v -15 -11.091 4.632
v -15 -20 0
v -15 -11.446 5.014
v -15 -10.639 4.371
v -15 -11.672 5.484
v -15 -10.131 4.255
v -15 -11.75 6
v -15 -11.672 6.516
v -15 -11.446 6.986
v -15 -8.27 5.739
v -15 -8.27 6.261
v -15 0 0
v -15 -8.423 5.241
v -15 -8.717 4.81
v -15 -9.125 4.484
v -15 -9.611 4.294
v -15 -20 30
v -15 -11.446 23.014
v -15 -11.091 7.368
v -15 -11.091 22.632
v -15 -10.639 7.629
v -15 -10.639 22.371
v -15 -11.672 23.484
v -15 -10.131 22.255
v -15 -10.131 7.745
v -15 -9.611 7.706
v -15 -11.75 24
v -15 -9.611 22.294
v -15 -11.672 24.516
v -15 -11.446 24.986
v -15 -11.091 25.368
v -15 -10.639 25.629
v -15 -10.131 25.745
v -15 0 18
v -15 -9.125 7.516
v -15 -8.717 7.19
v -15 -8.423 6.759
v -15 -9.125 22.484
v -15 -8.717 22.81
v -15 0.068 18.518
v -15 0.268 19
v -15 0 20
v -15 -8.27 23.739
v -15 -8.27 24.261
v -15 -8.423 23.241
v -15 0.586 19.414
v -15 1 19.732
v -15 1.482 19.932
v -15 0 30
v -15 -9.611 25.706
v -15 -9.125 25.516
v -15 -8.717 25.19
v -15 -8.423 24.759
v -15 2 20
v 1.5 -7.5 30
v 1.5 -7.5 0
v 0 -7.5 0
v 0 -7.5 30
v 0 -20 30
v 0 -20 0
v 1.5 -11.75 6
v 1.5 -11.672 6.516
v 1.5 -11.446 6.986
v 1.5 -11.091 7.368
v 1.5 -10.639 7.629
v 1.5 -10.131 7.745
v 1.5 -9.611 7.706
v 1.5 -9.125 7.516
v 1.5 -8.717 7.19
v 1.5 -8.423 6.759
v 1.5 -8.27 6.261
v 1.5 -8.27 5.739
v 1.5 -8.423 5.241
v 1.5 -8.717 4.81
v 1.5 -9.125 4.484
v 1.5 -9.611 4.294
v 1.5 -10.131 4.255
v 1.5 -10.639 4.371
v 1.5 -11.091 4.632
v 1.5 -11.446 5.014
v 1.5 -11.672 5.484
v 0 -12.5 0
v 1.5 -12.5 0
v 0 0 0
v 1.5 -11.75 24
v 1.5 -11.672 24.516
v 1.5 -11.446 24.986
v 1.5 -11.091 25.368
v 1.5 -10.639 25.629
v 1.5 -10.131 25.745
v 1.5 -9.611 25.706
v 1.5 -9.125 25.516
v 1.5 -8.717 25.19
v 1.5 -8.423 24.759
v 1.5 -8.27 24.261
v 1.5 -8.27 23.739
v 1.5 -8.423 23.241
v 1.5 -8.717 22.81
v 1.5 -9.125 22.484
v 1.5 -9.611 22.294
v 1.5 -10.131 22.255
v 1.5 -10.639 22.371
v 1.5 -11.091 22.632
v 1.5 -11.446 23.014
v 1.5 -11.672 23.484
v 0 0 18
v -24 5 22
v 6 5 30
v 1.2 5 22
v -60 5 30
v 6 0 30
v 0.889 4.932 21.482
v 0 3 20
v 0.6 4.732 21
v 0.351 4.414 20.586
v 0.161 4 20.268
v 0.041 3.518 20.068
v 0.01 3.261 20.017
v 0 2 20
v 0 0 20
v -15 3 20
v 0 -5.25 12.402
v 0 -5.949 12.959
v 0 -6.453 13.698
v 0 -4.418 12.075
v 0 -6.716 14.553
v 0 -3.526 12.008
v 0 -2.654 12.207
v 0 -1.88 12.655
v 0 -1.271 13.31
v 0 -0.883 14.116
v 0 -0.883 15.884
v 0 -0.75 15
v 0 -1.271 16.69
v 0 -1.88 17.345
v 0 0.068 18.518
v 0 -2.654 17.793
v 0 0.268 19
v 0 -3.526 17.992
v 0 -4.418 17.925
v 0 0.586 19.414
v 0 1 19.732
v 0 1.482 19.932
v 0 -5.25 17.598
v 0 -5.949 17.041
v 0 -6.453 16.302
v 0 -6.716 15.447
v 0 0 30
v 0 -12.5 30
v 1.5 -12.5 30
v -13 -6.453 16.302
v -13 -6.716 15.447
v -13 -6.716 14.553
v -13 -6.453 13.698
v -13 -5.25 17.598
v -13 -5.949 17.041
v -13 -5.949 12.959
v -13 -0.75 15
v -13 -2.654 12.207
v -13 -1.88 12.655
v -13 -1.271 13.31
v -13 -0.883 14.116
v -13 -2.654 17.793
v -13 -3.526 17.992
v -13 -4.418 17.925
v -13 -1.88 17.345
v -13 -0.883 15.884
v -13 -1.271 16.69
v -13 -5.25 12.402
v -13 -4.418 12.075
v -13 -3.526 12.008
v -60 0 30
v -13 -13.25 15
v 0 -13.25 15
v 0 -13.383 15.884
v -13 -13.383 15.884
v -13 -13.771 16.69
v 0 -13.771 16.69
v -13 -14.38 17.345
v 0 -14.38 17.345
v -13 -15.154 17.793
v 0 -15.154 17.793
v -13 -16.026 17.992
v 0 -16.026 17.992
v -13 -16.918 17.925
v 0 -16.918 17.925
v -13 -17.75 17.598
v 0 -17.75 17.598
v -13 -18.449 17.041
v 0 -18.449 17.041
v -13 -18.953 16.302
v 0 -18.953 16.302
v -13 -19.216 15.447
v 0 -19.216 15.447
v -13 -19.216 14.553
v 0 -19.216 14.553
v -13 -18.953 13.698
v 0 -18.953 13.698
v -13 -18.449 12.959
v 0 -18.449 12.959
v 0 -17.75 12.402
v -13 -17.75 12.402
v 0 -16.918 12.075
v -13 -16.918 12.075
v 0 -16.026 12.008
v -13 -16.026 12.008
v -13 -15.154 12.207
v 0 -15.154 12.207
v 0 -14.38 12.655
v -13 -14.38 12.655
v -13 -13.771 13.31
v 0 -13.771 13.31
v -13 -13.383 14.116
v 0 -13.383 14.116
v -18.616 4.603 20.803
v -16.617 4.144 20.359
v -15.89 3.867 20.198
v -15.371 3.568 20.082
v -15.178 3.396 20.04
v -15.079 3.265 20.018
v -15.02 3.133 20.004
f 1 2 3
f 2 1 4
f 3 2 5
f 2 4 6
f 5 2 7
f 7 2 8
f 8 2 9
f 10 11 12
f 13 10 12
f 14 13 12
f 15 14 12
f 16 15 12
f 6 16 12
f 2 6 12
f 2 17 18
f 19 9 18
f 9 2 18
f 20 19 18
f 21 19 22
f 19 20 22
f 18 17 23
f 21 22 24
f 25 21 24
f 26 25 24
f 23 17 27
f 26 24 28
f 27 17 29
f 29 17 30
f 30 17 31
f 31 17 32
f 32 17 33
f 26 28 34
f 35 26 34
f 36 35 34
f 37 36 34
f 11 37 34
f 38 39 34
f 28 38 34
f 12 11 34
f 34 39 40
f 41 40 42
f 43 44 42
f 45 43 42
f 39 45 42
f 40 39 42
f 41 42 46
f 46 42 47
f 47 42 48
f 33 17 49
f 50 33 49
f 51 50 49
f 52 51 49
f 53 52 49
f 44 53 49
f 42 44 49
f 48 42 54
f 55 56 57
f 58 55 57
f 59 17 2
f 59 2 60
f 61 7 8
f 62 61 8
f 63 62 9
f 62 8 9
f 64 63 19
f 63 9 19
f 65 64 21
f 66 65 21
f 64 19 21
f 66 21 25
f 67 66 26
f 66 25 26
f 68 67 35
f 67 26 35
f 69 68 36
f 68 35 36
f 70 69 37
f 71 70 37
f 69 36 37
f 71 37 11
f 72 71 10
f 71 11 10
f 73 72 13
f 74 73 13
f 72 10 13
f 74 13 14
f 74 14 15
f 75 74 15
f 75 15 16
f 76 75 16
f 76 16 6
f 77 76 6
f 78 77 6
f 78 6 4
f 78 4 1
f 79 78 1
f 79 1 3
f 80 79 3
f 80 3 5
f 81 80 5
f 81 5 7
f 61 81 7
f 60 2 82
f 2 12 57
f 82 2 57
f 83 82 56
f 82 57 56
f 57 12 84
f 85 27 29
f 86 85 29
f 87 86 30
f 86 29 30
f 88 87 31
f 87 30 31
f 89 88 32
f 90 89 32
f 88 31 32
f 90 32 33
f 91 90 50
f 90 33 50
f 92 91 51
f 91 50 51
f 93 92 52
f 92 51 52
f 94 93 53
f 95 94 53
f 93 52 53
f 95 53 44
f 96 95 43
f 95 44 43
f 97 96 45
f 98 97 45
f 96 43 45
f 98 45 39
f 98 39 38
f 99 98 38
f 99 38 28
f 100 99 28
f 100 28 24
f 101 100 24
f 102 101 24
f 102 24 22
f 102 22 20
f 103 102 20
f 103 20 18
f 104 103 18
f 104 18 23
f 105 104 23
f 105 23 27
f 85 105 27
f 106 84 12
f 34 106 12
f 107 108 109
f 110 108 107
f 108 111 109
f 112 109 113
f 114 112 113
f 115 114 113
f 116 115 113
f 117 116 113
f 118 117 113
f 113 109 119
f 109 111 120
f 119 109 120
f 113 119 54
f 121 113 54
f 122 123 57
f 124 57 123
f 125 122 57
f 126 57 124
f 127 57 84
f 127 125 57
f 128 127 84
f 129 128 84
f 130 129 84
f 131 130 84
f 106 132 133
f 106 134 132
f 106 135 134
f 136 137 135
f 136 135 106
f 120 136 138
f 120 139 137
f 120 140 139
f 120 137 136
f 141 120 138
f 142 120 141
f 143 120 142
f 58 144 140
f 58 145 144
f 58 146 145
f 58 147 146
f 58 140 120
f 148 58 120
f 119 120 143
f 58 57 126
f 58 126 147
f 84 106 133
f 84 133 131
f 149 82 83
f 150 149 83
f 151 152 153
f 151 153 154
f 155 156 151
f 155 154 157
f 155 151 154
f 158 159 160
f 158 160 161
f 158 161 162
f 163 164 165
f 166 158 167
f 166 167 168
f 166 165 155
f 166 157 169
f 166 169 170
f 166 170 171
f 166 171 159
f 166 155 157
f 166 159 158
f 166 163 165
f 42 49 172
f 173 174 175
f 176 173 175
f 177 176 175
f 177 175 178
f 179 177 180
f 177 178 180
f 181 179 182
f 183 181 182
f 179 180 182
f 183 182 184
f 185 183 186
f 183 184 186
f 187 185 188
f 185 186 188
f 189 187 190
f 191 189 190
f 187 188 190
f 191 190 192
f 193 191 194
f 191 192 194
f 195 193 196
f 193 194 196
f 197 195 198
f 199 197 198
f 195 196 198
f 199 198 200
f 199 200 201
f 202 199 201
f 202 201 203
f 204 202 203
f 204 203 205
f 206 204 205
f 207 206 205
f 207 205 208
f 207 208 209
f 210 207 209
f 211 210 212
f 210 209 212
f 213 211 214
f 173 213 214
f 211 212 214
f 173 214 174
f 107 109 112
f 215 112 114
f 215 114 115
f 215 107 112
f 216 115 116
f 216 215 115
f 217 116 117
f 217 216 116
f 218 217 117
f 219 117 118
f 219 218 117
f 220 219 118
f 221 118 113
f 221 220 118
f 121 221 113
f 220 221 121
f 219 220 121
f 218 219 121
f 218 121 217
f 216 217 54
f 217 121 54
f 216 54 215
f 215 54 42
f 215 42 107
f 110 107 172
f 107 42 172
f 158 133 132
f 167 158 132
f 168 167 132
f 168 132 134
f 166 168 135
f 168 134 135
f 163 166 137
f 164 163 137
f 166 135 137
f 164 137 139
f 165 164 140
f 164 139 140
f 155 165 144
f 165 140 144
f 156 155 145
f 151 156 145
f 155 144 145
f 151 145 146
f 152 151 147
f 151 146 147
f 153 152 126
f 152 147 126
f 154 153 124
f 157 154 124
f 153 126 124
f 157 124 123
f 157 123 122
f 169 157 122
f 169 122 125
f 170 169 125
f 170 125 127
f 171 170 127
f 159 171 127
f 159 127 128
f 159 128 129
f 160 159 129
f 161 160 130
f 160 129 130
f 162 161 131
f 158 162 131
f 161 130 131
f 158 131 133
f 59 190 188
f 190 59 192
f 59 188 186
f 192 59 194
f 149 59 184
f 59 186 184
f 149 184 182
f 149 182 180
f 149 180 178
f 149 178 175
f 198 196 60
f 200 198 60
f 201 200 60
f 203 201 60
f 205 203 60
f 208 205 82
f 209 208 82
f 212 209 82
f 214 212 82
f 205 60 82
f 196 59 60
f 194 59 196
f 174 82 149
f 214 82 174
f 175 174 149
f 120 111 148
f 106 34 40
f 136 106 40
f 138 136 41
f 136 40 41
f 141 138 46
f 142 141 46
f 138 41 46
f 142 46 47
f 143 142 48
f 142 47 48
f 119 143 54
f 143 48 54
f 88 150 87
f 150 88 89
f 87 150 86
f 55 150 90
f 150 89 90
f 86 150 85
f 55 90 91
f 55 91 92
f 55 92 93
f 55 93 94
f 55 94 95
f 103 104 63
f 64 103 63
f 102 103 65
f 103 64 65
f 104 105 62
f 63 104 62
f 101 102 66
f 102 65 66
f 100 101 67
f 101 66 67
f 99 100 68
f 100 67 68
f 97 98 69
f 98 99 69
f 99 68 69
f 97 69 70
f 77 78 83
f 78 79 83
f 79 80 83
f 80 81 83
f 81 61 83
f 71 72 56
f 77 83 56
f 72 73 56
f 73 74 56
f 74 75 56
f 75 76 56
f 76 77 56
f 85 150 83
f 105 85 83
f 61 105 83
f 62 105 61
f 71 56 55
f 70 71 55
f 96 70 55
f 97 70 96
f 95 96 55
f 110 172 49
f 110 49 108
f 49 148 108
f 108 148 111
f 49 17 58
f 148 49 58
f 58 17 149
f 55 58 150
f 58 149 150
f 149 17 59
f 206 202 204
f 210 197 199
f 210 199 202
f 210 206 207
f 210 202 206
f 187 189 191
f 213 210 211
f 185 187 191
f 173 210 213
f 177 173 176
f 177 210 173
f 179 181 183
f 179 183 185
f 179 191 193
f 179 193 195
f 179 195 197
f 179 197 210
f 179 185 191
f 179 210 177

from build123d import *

# Parameters (mm, degrees)
F1_DEPTH     = 30
F2_R         = 1.75
F3_DEPTH     = 16.501
F4_R         = 3
F5_DEPTH     = 13
F6_R         = 3
F7_DEPTH     = 13
F9_DEPTH     = 5
F10_T1_DEPTH = 15
F10_T3_DEPTH = 35


# Not quite as in the source:
# - a fillet or chamfer that OpenCascade refuses, or shapes differently, is made with other operations: its cross-section is extruded or revolved along the edge and cut away or added


with BuildPart() as f1:
    # F0 (on Top) → F1 (new body)
    with BuildSketch(Plane.XY):
        Polygon((0, -7.5), (0, 0), (-15, 0), (-15, -20), (0, -20), (0, -12.5), (1.5, -12.5), (1.5, -7.5), align=None)
    extrude(amount=F1_DEPTH)

    # F2 (on face) → F3 (cut, through all)
    with BuildSketch(Plane(origin=(-15, 0, 0), x_dir=(0, -1, 0), z_dir=(-1, 0, 0))):
        with Locations((10, 24)):
            Circle(F2_R)
        with Locations((10, 6)):
            Circle(F2_R)
    extrude(amount=-F3_DEPTH, mode=Mode.SUBTRACT)

    # F4 (on face) → F5 (cut)
    with BuildSketch(Plane.YZ):
        with Locations((-16.25, 15)):
            Circle(F4_R)
    extrude(amount=-F5_DEPTH, mode=Mode.SUBTRACT)

    # F6 (on face) → F7 (cut)
    with BuildSketch(Plane.YZ):
        with Locations((-3.75, 15)):
            Circle(F6_R)
    extrude(amount=-F7_DEPTH, mode=Mode.SUBTRACT)

    # F8 (on face) → F9 (join)
    with BuildSketch(Plane(origin=(0, 0, 0), x_dir=(-1, 0, 0), z_dir=(0, 1, 0))):
        Polygon((60, 30), (15, 30), (-6, 30), (0, 20), (15, 20), align=None)
    extrude(amount=F9_DEPTH)

    # F10: fillet of radius 2 on 2 edges, made by hand

    # F10_s2 → F10_t1 (join)
    with BuildSketch(Plane.YZ.offset(-15)):
        with BuildLine():
            ThreePointArc((0, 18), (0.5857864376, 19.4142135624), (2, 20))
            Line((2, 20), (0, 20))
            Line((0, 20), (0, 18))
        make_face()
    extrude(amount=F10_T1_DEPTH)

    # F10_s4 → F10_t3 (cut)
    with BuildSketch(Plane.YZ.offset(-30)):
        with BuildLine():
            ThreePointArc((5, 22), (4.4142135624, 20.5857864376), (3, 20))
            Line((3, 20), (5, 20))
            Line((5, 20), (5, 22))
        make_face()
    extrude(amount=F10_T3_DEPTH, mode=Mode.SUBTRACT)


solid = f1.part
